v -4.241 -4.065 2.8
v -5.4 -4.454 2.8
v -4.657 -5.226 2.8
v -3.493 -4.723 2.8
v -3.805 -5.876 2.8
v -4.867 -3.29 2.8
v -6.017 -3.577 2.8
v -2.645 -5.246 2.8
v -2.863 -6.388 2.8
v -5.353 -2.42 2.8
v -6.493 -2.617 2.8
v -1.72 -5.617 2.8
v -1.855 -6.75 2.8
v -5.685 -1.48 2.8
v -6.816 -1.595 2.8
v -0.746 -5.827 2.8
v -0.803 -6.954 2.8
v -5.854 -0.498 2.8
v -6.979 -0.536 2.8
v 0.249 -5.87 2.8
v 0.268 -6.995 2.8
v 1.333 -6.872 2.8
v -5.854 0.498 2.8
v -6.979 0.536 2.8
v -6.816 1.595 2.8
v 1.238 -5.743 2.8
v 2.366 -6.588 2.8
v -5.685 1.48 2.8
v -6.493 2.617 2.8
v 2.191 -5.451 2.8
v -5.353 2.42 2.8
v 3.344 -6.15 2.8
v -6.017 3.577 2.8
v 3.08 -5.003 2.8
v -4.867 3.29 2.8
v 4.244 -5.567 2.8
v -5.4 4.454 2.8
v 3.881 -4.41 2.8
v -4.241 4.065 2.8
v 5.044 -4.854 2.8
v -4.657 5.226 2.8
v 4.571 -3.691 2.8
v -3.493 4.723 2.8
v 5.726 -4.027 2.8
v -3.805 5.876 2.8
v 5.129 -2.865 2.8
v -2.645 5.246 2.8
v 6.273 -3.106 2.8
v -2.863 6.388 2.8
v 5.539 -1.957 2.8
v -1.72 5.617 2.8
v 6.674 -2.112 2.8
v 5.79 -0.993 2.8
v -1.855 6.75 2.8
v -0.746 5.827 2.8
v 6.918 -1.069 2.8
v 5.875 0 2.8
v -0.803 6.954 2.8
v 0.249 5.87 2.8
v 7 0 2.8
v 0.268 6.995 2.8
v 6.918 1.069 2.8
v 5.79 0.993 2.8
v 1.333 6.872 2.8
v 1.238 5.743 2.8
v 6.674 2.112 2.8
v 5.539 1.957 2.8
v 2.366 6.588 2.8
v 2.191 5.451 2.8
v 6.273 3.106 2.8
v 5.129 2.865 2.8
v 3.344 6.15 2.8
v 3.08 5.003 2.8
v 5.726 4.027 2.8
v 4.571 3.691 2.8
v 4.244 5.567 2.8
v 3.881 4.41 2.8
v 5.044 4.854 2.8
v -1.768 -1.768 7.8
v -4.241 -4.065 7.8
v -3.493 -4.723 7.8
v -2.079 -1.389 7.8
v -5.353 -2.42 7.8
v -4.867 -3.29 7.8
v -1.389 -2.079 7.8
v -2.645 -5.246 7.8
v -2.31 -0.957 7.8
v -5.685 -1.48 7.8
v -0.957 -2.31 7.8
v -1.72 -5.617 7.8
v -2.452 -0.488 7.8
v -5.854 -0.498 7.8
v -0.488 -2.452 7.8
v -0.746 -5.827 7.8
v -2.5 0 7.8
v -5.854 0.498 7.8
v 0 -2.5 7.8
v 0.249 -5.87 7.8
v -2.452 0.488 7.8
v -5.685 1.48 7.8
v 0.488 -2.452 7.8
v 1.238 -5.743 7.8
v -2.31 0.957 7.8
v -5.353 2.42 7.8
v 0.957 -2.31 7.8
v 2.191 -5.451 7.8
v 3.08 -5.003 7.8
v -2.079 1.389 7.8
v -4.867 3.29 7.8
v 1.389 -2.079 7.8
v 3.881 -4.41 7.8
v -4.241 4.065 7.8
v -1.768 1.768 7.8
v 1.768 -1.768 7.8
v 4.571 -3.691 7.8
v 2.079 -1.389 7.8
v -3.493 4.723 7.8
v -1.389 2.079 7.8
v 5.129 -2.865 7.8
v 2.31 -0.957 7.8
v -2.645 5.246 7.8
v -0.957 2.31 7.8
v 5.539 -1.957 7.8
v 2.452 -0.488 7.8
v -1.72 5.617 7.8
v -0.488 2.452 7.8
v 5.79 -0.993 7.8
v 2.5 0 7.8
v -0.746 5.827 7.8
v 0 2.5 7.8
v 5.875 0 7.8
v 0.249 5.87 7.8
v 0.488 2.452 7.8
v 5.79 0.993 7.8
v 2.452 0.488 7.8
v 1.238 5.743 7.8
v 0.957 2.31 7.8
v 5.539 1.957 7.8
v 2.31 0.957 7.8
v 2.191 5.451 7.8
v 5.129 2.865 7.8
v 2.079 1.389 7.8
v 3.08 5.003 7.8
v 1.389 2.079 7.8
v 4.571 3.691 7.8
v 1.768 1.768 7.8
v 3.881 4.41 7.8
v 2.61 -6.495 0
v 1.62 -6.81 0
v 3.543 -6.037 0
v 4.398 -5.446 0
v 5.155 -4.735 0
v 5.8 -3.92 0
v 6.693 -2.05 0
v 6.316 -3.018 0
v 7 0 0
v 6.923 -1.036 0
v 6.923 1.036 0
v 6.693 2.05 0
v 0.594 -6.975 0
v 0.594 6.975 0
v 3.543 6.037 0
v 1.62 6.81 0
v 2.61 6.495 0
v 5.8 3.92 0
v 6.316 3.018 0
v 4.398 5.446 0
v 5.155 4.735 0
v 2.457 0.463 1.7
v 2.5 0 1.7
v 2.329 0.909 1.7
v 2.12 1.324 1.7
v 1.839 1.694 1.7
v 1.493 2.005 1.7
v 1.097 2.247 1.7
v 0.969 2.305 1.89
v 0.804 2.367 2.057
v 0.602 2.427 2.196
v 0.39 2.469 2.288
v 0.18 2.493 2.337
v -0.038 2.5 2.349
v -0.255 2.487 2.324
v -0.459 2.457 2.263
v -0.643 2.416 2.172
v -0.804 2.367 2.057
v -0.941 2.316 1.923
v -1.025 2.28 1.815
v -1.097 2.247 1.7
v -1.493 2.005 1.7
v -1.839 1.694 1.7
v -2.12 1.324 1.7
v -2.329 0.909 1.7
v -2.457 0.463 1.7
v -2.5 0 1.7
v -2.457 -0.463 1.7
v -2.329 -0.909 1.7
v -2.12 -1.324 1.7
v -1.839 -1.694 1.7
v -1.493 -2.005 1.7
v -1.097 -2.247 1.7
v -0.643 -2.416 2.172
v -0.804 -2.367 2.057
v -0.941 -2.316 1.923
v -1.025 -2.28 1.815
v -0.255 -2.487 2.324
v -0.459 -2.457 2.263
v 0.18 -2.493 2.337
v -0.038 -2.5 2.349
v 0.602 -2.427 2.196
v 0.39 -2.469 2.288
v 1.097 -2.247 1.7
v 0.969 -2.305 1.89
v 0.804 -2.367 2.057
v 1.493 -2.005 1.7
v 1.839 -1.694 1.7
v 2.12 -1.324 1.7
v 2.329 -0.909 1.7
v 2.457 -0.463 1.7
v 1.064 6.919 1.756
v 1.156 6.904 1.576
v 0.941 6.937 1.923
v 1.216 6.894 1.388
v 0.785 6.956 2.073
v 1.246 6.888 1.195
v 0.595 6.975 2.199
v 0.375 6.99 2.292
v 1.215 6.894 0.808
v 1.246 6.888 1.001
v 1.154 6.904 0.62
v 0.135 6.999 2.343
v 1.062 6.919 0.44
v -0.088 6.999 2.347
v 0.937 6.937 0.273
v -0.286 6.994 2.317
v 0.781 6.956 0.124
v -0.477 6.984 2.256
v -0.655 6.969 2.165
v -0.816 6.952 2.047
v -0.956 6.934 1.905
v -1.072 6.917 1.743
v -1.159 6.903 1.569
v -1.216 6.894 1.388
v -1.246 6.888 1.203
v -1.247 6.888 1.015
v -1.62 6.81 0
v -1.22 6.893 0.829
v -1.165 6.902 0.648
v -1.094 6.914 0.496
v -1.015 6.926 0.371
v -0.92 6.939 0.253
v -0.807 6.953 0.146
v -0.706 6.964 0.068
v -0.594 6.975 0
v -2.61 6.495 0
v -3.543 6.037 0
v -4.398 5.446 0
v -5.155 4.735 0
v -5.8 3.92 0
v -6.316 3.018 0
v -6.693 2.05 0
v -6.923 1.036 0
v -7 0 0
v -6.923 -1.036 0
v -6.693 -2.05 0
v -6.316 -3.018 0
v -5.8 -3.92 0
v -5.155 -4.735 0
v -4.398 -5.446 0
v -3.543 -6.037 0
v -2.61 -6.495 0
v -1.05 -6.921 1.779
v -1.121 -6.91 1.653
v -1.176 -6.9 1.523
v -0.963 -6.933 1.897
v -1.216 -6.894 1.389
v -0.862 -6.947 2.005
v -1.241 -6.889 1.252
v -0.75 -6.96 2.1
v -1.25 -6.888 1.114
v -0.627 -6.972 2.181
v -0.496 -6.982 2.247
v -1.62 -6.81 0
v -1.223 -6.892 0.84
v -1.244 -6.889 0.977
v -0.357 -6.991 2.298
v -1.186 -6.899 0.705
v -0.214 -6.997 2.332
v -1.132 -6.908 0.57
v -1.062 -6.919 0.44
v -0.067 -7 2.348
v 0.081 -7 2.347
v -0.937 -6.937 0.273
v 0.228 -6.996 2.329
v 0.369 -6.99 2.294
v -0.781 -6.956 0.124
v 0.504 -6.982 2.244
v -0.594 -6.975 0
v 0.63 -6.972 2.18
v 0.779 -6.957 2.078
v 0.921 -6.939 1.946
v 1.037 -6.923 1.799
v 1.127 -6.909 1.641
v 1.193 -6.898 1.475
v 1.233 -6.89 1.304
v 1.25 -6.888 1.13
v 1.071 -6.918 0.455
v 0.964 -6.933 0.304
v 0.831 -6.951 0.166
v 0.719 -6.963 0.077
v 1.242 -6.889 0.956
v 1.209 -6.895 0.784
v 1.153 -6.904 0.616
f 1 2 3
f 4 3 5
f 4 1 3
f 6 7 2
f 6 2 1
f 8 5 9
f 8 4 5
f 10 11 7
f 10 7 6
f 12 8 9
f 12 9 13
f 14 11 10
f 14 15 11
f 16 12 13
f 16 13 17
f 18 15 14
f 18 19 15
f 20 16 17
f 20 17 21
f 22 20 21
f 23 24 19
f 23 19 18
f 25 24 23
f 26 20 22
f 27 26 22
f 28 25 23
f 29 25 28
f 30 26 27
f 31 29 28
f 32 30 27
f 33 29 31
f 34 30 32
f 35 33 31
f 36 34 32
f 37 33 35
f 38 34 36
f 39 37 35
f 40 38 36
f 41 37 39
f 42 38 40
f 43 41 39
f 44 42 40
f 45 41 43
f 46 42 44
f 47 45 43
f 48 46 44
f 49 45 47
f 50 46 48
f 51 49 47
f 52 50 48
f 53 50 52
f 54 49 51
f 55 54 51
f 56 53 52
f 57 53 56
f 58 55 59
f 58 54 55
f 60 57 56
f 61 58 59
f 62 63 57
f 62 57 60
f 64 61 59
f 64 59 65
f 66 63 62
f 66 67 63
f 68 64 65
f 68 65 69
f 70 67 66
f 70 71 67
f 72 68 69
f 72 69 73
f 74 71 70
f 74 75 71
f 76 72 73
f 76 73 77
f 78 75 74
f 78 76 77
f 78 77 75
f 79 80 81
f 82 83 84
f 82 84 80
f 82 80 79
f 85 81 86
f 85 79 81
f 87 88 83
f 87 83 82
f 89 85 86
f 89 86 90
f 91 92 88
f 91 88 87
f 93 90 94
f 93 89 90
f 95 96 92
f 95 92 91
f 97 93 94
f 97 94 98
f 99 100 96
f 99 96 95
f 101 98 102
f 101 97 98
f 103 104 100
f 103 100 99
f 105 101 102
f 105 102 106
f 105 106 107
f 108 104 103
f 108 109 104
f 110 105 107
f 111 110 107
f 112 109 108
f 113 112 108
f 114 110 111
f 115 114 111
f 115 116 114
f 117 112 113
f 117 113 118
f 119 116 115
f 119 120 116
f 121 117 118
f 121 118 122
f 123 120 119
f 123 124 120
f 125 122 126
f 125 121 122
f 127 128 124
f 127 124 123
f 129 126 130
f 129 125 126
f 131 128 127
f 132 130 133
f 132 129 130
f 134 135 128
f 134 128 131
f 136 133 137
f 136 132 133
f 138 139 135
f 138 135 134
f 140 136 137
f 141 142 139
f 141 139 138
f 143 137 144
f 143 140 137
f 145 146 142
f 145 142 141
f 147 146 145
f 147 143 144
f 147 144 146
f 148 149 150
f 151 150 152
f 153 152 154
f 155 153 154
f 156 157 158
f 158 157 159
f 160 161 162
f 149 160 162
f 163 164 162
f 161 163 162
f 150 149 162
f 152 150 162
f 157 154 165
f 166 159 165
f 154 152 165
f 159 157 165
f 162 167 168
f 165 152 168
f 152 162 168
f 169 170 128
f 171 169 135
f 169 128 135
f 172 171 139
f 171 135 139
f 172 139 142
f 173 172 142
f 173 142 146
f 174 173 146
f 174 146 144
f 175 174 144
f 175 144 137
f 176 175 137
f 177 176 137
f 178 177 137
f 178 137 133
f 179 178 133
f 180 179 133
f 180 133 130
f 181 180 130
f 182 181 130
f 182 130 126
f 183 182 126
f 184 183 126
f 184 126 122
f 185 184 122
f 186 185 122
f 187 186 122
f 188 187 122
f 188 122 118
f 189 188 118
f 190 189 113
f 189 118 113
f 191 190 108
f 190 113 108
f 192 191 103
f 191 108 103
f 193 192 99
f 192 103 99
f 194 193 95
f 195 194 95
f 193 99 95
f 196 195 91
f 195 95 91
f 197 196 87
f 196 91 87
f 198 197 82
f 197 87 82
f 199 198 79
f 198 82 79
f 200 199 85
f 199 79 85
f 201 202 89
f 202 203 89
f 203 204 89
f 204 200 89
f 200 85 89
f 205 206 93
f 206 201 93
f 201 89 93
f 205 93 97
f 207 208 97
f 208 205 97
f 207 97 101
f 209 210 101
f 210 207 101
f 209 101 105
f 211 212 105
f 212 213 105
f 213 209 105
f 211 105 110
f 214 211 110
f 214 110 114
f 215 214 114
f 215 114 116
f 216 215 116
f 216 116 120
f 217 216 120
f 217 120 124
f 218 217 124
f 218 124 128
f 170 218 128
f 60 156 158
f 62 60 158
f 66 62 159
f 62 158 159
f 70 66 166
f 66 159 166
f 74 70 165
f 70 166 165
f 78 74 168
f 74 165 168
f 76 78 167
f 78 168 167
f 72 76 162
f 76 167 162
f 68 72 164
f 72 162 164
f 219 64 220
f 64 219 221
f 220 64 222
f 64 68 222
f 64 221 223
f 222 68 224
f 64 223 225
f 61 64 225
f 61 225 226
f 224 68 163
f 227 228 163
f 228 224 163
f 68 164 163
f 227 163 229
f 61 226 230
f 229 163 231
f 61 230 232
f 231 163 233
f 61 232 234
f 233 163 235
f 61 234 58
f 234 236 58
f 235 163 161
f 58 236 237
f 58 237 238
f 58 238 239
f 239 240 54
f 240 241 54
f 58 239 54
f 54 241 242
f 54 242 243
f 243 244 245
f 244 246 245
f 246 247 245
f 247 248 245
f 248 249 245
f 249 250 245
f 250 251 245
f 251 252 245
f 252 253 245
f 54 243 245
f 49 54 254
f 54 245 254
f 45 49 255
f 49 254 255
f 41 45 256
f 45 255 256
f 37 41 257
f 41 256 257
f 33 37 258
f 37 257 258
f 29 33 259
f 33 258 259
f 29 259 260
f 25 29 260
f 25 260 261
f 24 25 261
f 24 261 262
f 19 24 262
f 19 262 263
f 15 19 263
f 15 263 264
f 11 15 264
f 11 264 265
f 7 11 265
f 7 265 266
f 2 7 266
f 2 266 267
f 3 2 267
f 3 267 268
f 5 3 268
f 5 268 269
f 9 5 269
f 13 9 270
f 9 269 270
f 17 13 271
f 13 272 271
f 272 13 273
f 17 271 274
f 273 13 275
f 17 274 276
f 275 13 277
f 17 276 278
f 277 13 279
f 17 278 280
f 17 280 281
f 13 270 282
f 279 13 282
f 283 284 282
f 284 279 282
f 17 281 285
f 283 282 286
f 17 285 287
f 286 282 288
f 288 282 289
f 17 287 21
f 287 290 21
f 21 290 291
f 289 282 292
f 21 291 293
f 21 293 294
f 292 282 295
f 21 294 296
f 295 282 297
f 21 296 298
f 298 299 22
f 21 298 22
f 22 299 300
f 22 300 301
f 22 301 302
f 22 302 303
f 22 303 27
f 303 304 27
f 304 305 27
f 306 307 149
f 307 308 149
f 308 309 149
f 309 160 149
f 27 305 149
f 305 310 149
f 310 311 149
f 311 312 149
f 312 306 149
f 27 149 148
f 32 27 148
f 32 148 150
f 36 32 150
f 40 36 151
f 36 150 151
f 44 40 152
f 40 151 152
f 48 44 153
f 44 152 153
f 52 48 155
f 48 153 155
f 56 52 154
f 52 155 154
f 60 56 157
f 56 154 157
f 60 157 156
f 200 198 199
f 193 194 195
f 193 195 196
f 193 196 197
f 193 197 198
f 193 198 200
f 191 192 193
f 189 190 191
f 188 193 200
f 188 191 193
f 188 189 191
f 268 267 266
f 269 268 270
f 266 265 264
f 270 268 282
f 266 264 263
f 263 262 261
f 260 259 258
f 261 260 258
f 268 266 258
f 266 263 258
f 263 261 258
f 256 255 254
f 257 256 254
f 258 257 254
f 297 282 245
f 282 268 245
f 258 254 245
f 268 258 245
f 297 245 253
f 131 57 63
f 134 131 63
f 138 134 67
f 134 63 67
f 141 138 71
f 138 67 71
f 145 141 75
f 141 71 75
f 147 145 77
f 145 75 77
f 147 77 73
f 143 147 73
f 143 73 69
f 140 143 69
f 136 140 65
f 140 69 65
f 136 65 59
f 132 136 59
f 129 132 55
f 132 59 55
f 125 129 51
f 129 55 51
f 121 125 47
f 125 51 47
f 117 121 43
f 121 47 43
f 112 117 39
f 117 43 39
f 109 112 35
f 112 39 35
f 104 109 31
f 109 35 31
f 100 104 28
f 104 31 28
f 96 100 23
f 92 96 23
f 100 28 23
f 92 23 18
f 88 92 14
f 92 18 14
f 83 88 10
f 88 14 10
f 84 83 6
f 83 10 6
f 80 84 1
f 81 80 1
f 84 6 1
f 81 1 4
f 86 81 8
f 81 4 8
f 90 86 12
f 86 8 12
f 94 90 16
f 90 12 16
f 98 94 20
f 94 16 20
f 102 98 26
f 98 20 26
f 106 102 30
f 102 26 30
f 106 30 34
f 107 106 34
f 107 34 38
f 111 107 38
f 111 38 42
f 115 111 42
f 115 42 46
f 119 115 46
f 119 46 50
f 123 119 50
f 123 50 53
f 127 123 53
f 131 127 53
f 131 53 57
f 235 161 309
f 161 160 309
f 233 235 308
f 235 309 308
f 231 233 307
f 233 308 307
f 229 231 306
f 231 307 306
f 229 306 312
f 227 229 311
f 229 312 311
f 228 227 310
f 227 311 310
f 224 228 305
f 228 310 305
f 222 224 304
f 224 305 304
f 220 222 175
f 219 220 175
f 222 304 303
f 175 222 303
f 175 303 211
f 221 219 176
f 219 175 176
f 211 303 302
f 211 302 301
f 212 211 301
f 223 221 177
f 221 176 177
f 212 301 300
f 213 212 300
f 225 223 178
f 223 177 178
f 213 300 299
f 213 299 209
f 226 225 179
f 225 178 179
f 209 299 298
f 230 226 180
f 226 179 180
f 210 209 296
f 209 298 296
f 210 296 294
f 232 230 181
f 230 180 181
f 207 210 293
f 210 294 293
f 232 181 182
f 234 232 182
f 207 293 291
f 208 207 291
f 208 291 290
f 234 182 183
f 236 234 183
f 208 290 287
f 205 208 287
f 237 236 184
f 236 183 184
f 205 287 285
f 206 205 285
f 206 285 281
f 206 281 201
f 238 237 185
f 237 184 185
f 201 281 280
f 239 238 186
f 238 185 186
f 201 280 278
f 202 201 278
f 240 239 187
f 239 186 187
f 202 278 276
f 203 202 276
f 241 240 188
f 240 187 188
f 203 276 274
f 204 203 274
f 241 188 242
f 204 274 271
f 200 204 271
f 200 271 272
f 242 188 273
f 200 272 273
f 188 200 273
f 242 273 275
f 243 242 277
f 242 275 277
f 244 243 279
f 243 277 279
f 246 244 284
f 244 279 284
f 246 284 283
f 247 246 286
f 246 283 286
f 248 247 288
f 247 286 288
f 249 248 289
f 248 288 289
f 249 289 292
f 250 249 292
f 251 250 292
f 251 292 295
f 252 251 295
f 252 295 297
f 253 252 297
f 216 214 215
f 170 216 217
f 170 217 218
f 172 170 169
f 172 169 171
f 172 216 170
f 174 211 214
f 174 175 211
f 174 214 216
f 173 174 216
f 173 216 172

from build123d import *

# Parameters (mm, degrees)
F0_R          = 7
F1_DEPTH      = 2.8
F2_R          = 5.875
F3_DEPTH      = 5
F4_R          = 1.25
F5_DEPTH      = 7.001
F5_DEPTH_BACK = 7.001
F6_R          = 2.5
F7_DEPTH      = 6.1


with BuildPart() as f1:
    # F0 (on Top) → F1 (new body)
    with BuildSketch(Plane.XY):
        Circle(F0_R)
    extrude(amount=F1_DEPTH)

    # F2 (on face) → F3 (join)
    with BuildSketch(Plane.XY.offset(2.8)):
        Circle(F2_R)
    extrude(amount=F3_DEPTH)

    # F4 (on Front) → F5 (cut, two sides)
    with BuildSketch(Plane.XZ) as f5_sk:
        with Locations((0, 1.1)):
            Circle(F4_R)
    extrude(amount=-F5_DEPTH, mode=Mode.SUBTRACT)
    extrude(f5_sk.sketch, amount=F5_DEPTH_BACK, mode=Mode.SUBTRACT)

    # F6 (on face) → F7 (cut, through all)
    with BuildSketch(Plane.XY.offset(7.8)):
        Circle(F6_R)
    extrude(amount=-F7_DEPTH, mode=Mode.SUBTRACT)


solid = f1.part
